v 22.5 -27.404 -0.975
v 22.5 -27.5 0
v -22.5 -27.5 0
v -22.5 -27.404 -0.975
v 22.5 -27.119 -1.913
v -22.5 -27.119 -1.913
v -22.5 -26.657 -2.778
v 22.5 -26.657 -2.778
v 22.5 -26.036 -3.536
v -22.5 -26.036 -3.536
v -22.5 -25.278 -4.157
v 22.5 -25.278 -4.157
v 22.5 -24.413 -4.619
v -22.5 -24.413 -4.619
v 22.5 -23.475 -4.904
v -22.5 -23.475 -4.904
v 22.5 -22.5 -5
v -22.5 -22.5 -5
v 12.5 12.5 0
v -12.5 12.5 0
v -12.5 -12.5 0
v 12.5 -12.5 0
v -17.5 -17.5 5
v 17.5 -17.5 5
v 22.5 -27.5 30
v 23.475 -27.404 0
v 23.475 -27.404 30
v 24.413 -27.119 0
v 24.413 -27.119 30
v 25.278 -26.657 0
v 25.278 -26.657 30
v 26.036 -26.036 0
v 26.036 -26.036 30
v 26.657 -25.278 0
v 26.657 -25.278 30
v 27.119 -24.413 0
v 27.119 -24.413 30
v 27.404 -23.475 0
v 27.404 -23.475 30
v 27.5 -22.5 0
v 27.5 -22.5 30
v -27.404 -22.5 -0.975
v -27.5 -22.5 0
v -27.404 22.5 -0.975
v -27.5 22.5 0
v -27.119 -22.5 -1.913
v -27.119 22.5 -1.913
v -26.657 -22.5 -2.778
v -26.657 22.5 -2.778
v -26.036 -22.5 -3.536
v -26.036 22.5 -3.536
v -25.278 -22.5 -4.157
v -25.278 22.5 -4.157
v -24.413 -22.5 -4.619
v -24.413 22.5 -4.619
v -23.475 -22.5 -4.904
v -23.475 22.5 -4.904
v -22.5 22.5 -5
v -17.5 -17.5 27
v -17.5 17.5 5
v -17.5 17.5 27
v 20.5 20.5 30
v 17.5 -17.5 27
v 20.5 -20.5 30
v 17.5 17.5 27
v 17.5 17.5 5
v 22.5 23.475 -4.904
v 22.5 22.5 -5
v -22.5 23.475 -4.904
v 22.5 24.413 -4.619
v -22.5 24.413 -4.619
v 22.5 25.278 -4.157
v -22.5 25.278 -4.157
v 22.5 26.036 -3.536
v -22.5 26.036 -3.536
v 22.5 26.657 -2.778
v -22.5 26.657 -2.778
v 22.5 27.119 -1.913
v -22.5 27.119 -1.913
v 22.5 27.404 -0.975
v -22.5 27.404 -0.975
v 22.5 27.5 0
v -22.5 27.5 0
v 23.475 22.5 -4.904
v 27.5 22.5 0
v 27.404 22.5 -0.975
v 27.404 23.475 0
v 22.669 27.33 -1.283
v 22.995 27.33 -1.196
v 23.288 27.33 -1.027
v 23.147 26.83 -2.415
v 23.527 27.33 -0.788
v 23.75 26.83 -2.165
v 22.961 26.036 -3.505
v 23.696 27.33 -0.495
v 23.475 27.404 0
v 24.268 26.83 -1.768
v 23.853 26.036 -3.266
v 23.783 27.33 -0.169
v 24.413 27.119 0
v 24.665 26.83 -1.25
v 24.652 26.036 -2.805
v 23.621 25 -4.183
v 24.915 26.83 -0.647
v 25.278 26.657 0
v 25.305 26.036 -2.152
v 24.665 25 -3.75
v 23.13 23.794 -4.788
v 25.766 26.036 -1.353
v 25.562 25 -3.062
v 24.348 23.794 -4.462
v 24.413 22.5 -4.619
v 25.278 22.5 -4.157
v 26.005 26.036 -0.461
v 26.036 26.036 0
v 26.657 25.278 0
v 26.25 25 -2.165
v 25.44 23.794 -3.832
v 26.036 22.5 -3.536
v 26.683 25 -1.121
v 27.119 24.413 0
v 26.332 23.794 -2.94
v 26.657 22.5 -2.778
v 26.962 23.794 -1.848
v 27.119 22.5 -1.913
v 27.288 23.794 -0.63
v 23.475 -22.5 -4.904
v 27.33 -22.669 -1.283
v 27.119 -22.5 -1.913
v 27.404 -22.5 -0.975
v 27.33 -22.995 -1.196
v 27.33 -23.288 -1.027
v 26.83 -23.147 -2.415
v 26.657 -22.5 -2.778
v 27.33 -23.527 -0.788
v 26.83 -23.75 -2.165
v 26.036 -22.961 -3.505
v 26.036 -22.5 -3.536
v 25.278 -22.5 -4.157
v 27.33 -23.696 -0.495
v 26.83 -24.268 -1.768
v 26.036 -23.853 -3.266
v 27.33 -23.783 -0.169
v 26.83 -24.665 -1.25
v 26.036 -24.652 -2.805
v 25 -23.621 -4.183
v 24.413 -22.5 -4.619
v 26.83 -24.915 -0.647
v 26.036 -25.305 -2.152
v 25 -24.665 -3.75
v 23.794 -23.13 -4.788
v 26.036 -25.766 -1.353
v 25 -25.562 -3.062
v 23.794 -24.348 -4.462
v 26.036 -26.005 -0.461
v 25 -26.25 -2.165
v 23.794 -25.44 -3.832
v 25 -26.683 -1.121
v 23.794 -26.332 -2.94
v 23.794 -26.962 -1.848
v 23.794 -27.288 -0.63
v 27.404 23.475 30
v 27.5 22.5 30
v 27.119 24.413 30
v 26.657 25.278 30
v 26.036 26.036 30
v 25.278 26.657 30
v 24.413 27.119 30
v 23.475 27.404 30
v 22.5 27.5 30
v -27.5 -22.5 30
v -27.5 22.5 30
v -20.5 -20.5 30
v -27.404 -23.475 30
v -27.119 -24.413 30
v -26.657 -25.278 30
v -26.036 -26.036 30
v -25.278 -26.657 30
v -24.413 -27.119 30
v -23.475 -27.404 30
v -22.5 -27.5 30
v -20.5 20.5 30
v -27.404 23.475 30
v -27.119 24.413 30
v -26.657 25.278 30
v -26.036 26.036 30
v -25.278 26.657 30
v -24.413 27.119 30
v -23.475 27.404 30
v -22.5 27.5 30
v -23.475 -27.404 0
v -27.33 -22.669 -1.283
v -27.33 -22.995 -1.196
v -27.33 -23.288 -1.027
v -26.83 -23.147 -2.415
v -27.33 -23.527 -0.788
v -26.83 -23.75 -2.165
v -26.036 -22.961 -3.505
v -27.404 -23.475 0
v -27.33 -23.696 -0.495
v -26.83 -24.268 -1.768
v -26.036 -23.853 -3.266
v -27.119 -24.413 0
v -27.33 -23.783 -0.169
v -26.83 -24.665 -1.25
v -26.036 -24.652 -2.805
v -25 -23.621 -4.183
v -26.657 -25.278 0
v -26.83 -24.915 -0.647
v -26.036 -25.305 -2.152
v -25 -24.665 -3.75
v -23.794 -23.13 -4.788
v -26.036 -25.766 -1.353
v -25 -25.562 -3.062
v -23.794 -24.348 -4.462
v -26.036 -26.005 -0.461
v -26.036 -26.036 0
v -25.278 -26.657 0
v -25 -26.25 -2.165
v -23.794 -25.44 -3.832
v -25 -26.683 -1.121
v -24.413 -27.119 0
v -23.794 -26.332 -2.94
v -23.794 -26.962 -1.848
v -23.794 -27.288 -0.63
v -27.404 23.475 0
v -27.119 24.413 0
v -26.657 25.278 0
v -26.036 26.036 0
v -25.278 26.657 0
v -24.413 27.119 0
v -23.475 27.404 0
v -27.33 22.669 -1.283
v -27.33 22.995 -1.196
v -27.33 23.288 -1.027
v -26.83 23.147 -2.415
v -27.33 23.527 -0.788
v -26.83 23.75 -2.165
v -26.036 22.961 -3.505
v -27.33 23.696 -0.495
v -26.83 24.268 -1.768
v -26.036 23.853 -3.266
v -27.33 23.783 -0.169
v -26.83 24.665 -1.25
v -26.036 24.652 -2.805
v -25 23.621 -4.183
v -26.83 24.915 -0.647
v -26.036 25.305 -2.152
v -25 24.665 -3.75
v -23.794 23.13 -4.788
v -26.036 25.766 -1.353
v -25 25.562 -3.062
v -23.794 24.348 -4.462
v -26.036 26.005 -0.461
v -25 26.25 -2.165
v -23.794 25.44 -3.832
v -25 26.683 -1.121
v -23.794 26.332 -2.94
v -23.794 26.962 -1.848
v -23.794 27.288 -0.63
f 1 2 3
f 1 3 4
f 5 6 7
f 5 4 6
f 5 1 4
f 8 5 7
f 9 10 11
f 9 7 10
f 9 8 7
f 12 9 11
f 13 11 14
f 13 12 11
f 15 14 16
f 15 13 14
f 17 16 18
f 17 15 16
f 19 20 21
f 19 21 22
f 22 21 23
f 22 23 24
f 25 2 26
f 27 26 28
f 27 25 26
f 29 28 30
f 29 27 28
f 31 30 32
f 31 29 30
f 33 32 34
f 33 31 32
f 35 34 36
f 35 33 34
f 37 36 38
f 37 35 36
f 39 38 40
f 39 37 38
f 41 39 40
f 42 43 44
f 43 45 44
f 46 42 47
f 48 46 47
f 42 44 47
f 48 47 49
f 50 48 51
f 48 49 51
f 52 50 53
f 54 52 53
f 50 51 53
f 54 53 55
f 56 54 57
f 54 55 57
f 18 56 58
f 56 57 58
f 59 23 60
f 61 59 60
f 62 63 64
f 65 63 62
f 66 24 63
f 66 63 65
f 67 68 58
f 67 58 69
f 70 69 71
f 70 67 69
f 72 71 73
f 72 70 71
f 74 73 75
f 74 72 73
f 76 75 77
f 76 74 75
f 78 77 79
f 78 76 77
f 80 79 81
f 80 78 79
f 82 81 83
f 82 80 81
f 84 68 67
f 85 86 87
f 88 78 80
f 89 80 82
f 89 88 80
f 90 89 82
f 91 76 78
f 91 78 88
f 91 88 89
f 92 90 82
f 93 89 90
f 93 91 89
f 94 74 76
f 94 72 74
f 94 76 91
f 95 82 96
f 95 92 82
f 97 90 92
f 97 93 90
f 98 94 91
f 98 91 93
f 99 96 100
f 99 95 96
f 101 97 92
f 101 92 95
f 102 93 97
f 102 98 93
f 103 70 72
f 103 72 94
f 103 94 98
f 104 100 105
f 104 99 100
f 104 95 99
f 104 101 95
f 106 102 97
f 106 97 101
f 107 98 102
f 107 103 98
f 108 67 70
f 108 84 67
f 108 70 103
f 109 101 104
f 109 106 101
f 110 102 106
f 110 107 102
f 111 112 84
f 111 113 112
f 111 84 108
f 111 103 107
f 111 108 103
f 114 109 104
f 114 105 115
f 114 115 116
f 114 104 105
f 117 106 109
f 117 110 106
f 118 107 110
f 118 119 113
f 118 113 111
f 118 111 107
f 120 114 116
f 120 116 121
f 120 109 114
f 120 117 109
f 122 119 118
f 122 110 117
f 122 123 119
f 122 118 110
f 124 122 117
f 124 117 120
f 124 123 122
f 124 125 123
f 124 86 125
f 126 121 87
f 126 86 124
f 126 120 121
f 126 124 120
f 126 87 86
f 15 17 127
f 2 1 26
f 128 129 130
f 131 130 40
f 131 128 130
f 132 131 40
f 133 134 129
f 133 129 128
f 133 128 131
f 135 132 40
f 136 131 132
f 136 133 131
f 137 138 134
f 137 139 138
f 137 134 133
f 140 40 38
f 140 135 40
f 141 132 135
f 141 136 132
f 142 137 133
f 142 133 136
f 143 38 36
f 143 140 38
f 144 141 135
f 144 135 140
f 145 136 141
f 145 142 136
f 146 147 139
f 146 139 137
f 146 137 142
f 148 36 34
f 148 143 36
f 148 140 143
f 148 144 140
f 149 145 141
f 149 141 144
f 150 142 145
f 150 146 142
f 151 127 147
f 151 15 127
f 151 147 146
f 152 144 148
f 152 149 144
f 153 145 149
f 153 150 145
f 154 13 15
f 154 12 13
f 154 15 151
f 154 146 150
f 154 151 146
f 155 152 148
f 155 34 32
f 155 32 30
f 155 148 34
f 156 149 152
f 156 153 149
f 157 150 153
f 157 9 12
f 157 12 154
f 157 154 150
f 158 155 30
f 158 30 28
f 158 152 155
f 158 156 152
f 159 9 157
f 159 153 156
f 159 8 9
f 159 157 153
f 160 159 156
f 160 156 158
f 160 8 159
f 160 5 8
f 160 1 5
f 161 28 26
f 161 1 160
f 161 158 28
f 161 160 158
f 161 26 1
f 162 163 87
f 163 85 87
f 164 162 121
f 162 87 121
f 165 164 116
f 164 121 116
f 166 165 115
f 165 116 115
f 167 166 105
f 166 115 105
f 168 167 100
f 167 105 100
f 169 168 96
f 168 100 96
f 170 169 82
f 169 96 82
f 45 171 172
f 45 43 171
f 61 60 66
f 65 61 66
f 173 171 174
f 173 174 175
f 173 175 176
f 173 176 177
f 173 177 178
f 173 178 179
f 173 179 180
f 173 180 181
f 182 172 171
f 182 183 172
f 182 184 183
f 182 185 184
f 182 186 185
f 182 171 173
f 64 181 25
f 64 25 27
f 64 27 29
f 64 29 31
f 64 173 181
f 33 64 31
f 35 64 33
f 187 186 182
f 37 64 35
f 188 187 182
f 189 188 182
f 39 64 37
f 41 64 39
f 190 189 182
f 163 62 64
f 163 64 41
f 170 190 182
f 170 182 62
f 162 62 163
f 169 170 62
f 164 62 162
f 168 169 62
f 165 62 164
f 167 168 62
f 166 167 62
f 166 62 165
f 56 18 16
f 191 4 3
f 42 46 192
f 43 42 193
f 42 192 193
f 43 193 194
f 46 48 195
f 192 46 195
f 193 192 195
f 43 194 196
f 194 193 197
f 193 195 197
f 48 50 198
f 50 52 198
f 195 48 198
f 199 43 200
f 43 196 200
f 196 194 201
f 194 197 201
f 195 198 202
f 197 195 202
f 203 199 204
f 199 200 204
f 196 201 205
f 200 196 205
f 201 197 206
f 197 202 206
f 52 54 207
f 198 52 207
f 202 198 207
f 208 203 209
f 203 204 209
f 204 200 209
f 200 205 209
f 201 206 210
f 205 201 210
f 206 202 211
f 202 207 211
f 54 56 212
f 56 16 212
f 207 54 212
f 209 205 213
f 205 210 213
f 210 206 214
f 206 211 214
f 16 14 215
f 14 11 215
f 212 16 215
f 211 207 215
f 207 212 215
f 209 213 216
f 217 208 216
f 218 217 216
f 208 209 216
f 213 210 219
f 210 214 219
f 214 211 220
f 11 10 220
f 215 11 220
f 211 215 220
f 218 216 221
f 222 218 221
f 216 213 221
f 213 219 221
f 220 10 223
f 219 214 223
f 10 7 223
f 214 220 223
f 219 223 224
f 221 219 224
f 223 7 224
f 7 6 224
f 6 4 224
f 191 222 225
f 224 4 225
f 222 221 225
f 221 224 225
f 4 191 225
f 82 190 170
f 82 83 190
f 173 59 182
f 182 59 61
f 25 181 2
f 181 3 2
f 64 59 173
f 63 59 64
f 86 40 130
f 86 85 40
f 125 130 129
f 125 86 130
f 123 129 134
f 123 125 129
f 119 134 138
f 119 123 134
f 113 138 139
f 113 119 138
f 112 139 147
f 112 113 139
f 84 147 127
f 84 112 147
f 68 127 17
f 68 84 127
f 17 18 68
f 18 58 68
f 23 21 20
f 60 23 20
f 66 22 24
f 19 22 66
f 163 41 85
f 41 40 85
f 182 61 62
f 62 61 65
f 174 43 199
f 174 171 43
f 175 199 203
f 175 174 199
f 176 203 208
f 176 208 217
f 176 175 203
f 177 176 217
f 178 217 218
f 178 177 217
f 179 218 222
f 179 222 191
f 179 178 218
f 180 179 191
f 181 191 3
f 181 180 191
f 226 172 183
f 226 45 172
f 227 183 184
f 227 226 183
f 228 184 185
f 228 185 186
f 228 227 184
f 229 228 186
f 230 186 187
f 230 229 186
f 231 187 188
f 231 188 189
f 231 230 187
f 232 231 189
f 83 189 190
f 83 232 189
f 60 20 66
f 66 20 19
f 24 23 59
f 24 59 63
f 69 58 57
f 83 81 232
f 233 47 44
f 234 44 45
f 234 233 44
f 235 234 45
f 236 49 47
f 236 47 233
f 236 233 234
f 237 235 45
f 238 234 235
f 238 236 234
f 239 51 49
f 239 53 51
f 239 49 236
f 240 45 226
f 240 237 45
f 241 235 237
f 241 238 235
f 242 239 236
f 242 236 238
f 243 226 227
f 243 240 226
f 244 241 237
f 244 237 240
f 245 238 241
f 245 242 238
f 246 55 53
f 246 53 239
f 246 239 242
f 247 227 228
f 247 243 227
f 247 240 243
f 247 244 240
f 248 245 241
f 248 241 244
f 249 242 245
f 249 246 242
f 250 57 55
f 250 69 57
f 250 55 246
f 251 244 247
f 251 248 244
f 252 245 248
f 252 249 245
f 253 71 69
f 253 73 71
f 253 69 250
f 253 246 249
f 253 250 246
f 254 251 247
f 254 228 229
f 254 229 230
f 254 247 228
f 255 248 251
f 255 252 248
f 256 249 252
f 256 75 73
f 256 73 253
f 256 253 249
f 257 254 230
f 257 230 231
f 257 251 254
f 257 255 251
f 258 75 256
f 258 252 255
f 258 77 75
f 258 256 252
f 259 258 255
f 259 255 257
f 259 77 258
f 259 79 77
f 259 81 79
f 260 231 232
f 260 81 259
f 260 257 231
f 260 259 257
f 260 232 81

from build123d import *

# Parameters (mm, degrees)
F0_W     = 55
F0_H     = 55
F0_W_2   = 35
F0_H_2   = 35
F1_DEPTH = 5
F2_DEPTH = 30
F3_R     = 5
F4_SIZE  = 3
F5_SIZE  = 5


with BuildPart() as f1:
    # F0 (on Top) → F1 (new body)
    with BuildSketch(Plane.XY):
        Rectangle(F0_W, F0_H)
        Rectangle(F0_W_2, F0_H_2, mode=Mode.SUBTRACT)
        Rectangle(F0_W_2, F0_H_2)
    extrude(amount=-F1_DEPTH)

    # F0 (on Top) → F2 (join)
    with BuildSketch(Plane.XY):
        Rectangle(F0_W, F0_H)
        Rectangle(F0_W_2, F0_H_2, mode=Mode.SUBTRACT)
    extrude(amount=F2_DEPTH)

    # F3
    f3_edges = [f1.edges().sort_by_distance(p)[0] for p in [
        (0, -27.5, -5),
        (27.5, 0, -5),
        (0, 27.5, -5),
        (-27.5, 0, -5),
        (27.5, 27.5, 12.5),
        (-27.5, 27.5, 12.5),
        (-27.5, -27.5, 12.5),
        (27.5, -27.5, 12.5),
    ]]
    fillet(f3_edges, radius=F3_R)

    # F4
    f4_edges = [f1.edges().sort_by_distance(p)[0] for p in [
        (-17.5, 0, 30),
        (0, -17.5, 30),
        (17.5, 0, 30),
        (0, 17.5, 30),
    ]]
    chamfer(f4_edges, length=F4_SIZE)

    # F5
    f5_edges = [f1.edges().sort_by_distance(p)[0] for p in [
        (17.5, 0, 0),
        (0, -17.5, 0),
        (-17.5, 0, 0),
        (0, 17.5, 0),
    ]]
    chamfer(f5_edges, length=F5_SIZE)


solid = f1.part
